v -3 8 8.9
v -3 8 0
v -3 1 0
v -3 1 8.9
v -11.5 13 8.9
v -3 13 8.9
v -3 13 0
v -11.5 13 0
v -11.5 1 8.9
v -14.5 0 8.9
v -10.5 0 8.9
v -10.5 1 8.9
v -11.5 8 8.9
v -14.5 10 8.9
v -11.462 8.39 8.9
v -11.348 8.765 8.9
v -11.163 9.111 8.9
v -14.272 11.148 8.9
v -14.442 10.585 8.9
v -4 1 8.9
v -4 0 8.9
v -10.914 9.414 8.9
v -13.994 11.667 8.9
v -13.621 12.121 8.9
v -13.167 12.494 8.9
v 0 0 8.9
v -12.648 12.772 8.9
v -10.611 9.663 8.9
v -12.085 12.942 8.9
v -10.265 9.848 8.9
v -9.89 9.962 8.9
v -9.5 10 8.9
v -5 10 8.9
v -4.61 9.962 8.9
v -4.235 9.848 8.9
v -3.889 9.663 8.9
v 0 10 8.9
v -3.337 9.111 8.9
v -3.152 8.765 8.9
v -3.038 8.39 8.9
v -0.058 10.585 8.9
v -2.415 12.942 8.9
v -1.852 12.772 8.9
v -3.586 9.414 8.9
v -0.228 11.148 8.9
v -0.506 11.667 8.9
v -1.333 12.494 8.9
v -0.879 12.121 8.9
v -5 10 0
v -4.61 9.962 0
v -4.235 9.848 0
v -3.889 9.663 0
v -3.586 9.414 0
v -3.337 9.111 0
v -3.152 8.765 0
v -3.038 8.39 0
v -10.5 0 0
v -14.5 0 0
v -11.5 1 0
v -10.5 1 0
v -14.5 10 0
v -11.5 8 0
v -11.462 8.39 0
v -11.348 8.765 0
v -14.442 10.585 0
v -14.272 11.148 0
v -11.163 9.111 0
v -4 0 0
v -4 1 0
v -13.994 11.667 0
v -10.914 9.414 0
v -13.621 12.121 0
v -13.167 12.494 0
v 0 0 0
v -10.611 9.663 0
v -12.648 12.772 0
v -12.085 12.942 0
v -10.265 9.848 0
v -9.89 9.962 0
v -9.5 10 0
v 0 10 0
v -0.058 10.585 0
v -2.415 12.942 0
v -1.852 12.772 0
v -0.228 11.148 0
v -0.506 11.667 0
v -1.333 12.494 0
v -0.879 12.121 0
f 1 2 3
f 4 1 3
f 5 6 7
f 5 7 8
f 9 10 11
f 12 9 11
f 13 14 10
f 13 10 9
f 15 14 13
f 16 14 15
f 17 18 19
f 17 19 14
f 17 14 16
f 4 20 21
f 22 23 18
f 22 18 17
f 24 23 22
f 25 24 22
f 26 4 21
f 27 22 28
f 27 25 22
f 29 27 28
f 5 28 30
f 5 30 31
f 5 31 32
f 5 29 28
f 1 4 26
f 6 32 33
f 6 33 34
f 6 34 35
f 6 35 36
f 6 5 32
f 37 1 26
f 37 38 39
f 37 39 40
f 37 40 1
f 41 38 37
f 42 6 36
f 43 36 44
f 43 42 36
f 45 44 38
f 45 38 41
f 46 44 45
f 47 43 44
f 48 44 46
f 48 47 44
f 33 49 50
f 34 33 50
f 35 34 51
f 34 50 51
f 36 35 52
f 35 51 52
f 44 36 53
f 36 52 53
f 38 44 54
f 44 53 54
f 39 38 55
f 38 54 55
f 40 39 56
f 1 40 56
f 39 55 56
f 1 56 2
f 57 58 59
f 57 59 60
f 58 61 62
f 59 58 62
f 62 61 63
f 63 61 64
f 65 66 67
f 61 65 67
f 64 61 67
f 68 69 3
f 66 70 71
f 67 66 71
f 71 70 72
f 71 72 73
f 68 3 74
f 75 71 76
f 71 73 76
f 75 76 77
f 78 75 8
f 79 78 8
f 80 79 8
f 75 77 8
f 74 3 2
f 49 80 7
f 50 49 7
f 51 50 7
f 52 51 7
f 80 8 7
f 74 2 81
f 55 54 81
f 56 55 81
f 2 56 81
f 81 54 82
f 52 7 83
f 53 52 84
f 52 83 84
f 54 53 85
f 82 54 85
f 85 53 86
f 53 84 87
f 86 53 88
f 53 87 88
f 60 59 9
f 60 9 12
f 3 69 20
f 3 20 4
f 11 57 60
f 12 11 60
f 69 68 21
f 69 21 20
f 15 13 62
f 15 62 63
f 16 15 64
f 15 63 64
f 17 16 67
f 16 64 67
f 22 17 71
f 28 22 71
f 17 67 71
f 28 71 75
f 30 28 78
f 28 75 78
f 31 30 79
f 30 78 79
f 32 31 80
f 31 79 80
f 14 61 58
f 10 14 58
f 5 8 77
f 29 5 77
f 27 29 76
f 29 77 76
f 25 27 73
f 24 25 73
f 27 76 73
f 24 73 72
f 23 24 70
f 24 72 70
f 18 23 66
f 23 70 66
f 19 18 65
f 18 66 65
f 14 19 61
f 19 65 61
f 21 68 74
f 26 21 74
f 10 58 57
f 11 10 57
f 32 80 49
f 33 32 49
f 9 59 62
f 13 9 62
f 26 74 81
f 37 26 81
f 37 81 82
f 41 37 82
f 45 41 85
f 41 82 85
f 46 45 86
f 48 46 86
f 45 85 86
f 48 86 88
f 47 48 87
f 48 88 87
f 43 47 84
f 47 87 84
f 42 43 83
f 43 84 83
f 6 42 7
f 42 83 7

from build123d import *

# Parameters (mm, degrees)
F0_W     = 1
F0_H     = 1
F1_DEPTH = 8.9


with BuildPart() as f1:
    # F0 (on Top) → F1 (new body)
    with BuildSketch(Plane.XY):
        with Locations((-11, 0.5)):
            Rectangle(F0_W, F0_H)
        with BuildLine():
            Line((-14.5, 10), (-14.5, 0))
            Line((-14.5, 0), (-11.5, 0))
            Line((-11.5, 0), (-11.5, 1))
            Line((-11.5, 1), (-11.5, 8))
            ThreePointArc((-11.5, 8), (-10.914214, 9.414214), (-9.5, 10))
            Line((-9.5, 10), (-5, 10))
            ThreePointArc((-5, 10), (-3.585786, 9.414214), (-3, 8))
            Line((-3, 8), (-3, 1))
            Line((-3, 1), (-3, 0))
            Line((-3, 0), (0, 0))
            Line((0, 0), (0, 10))
            ThreePointArc((0, 10), (-0.87868, 12.12132), (-3, 13))
            Line((-3, 13), (-11.5, 13))
            ThreePointArc((-11.5, 13), (-13.62132, 12.12132), (-14.5, 10))
        make_face()
        with Locations((-3.5, 0.5)):
            Rectangle(F0_W, F0_H)
    extrude(amount=F1_DEPTH)


solid = f1.part
